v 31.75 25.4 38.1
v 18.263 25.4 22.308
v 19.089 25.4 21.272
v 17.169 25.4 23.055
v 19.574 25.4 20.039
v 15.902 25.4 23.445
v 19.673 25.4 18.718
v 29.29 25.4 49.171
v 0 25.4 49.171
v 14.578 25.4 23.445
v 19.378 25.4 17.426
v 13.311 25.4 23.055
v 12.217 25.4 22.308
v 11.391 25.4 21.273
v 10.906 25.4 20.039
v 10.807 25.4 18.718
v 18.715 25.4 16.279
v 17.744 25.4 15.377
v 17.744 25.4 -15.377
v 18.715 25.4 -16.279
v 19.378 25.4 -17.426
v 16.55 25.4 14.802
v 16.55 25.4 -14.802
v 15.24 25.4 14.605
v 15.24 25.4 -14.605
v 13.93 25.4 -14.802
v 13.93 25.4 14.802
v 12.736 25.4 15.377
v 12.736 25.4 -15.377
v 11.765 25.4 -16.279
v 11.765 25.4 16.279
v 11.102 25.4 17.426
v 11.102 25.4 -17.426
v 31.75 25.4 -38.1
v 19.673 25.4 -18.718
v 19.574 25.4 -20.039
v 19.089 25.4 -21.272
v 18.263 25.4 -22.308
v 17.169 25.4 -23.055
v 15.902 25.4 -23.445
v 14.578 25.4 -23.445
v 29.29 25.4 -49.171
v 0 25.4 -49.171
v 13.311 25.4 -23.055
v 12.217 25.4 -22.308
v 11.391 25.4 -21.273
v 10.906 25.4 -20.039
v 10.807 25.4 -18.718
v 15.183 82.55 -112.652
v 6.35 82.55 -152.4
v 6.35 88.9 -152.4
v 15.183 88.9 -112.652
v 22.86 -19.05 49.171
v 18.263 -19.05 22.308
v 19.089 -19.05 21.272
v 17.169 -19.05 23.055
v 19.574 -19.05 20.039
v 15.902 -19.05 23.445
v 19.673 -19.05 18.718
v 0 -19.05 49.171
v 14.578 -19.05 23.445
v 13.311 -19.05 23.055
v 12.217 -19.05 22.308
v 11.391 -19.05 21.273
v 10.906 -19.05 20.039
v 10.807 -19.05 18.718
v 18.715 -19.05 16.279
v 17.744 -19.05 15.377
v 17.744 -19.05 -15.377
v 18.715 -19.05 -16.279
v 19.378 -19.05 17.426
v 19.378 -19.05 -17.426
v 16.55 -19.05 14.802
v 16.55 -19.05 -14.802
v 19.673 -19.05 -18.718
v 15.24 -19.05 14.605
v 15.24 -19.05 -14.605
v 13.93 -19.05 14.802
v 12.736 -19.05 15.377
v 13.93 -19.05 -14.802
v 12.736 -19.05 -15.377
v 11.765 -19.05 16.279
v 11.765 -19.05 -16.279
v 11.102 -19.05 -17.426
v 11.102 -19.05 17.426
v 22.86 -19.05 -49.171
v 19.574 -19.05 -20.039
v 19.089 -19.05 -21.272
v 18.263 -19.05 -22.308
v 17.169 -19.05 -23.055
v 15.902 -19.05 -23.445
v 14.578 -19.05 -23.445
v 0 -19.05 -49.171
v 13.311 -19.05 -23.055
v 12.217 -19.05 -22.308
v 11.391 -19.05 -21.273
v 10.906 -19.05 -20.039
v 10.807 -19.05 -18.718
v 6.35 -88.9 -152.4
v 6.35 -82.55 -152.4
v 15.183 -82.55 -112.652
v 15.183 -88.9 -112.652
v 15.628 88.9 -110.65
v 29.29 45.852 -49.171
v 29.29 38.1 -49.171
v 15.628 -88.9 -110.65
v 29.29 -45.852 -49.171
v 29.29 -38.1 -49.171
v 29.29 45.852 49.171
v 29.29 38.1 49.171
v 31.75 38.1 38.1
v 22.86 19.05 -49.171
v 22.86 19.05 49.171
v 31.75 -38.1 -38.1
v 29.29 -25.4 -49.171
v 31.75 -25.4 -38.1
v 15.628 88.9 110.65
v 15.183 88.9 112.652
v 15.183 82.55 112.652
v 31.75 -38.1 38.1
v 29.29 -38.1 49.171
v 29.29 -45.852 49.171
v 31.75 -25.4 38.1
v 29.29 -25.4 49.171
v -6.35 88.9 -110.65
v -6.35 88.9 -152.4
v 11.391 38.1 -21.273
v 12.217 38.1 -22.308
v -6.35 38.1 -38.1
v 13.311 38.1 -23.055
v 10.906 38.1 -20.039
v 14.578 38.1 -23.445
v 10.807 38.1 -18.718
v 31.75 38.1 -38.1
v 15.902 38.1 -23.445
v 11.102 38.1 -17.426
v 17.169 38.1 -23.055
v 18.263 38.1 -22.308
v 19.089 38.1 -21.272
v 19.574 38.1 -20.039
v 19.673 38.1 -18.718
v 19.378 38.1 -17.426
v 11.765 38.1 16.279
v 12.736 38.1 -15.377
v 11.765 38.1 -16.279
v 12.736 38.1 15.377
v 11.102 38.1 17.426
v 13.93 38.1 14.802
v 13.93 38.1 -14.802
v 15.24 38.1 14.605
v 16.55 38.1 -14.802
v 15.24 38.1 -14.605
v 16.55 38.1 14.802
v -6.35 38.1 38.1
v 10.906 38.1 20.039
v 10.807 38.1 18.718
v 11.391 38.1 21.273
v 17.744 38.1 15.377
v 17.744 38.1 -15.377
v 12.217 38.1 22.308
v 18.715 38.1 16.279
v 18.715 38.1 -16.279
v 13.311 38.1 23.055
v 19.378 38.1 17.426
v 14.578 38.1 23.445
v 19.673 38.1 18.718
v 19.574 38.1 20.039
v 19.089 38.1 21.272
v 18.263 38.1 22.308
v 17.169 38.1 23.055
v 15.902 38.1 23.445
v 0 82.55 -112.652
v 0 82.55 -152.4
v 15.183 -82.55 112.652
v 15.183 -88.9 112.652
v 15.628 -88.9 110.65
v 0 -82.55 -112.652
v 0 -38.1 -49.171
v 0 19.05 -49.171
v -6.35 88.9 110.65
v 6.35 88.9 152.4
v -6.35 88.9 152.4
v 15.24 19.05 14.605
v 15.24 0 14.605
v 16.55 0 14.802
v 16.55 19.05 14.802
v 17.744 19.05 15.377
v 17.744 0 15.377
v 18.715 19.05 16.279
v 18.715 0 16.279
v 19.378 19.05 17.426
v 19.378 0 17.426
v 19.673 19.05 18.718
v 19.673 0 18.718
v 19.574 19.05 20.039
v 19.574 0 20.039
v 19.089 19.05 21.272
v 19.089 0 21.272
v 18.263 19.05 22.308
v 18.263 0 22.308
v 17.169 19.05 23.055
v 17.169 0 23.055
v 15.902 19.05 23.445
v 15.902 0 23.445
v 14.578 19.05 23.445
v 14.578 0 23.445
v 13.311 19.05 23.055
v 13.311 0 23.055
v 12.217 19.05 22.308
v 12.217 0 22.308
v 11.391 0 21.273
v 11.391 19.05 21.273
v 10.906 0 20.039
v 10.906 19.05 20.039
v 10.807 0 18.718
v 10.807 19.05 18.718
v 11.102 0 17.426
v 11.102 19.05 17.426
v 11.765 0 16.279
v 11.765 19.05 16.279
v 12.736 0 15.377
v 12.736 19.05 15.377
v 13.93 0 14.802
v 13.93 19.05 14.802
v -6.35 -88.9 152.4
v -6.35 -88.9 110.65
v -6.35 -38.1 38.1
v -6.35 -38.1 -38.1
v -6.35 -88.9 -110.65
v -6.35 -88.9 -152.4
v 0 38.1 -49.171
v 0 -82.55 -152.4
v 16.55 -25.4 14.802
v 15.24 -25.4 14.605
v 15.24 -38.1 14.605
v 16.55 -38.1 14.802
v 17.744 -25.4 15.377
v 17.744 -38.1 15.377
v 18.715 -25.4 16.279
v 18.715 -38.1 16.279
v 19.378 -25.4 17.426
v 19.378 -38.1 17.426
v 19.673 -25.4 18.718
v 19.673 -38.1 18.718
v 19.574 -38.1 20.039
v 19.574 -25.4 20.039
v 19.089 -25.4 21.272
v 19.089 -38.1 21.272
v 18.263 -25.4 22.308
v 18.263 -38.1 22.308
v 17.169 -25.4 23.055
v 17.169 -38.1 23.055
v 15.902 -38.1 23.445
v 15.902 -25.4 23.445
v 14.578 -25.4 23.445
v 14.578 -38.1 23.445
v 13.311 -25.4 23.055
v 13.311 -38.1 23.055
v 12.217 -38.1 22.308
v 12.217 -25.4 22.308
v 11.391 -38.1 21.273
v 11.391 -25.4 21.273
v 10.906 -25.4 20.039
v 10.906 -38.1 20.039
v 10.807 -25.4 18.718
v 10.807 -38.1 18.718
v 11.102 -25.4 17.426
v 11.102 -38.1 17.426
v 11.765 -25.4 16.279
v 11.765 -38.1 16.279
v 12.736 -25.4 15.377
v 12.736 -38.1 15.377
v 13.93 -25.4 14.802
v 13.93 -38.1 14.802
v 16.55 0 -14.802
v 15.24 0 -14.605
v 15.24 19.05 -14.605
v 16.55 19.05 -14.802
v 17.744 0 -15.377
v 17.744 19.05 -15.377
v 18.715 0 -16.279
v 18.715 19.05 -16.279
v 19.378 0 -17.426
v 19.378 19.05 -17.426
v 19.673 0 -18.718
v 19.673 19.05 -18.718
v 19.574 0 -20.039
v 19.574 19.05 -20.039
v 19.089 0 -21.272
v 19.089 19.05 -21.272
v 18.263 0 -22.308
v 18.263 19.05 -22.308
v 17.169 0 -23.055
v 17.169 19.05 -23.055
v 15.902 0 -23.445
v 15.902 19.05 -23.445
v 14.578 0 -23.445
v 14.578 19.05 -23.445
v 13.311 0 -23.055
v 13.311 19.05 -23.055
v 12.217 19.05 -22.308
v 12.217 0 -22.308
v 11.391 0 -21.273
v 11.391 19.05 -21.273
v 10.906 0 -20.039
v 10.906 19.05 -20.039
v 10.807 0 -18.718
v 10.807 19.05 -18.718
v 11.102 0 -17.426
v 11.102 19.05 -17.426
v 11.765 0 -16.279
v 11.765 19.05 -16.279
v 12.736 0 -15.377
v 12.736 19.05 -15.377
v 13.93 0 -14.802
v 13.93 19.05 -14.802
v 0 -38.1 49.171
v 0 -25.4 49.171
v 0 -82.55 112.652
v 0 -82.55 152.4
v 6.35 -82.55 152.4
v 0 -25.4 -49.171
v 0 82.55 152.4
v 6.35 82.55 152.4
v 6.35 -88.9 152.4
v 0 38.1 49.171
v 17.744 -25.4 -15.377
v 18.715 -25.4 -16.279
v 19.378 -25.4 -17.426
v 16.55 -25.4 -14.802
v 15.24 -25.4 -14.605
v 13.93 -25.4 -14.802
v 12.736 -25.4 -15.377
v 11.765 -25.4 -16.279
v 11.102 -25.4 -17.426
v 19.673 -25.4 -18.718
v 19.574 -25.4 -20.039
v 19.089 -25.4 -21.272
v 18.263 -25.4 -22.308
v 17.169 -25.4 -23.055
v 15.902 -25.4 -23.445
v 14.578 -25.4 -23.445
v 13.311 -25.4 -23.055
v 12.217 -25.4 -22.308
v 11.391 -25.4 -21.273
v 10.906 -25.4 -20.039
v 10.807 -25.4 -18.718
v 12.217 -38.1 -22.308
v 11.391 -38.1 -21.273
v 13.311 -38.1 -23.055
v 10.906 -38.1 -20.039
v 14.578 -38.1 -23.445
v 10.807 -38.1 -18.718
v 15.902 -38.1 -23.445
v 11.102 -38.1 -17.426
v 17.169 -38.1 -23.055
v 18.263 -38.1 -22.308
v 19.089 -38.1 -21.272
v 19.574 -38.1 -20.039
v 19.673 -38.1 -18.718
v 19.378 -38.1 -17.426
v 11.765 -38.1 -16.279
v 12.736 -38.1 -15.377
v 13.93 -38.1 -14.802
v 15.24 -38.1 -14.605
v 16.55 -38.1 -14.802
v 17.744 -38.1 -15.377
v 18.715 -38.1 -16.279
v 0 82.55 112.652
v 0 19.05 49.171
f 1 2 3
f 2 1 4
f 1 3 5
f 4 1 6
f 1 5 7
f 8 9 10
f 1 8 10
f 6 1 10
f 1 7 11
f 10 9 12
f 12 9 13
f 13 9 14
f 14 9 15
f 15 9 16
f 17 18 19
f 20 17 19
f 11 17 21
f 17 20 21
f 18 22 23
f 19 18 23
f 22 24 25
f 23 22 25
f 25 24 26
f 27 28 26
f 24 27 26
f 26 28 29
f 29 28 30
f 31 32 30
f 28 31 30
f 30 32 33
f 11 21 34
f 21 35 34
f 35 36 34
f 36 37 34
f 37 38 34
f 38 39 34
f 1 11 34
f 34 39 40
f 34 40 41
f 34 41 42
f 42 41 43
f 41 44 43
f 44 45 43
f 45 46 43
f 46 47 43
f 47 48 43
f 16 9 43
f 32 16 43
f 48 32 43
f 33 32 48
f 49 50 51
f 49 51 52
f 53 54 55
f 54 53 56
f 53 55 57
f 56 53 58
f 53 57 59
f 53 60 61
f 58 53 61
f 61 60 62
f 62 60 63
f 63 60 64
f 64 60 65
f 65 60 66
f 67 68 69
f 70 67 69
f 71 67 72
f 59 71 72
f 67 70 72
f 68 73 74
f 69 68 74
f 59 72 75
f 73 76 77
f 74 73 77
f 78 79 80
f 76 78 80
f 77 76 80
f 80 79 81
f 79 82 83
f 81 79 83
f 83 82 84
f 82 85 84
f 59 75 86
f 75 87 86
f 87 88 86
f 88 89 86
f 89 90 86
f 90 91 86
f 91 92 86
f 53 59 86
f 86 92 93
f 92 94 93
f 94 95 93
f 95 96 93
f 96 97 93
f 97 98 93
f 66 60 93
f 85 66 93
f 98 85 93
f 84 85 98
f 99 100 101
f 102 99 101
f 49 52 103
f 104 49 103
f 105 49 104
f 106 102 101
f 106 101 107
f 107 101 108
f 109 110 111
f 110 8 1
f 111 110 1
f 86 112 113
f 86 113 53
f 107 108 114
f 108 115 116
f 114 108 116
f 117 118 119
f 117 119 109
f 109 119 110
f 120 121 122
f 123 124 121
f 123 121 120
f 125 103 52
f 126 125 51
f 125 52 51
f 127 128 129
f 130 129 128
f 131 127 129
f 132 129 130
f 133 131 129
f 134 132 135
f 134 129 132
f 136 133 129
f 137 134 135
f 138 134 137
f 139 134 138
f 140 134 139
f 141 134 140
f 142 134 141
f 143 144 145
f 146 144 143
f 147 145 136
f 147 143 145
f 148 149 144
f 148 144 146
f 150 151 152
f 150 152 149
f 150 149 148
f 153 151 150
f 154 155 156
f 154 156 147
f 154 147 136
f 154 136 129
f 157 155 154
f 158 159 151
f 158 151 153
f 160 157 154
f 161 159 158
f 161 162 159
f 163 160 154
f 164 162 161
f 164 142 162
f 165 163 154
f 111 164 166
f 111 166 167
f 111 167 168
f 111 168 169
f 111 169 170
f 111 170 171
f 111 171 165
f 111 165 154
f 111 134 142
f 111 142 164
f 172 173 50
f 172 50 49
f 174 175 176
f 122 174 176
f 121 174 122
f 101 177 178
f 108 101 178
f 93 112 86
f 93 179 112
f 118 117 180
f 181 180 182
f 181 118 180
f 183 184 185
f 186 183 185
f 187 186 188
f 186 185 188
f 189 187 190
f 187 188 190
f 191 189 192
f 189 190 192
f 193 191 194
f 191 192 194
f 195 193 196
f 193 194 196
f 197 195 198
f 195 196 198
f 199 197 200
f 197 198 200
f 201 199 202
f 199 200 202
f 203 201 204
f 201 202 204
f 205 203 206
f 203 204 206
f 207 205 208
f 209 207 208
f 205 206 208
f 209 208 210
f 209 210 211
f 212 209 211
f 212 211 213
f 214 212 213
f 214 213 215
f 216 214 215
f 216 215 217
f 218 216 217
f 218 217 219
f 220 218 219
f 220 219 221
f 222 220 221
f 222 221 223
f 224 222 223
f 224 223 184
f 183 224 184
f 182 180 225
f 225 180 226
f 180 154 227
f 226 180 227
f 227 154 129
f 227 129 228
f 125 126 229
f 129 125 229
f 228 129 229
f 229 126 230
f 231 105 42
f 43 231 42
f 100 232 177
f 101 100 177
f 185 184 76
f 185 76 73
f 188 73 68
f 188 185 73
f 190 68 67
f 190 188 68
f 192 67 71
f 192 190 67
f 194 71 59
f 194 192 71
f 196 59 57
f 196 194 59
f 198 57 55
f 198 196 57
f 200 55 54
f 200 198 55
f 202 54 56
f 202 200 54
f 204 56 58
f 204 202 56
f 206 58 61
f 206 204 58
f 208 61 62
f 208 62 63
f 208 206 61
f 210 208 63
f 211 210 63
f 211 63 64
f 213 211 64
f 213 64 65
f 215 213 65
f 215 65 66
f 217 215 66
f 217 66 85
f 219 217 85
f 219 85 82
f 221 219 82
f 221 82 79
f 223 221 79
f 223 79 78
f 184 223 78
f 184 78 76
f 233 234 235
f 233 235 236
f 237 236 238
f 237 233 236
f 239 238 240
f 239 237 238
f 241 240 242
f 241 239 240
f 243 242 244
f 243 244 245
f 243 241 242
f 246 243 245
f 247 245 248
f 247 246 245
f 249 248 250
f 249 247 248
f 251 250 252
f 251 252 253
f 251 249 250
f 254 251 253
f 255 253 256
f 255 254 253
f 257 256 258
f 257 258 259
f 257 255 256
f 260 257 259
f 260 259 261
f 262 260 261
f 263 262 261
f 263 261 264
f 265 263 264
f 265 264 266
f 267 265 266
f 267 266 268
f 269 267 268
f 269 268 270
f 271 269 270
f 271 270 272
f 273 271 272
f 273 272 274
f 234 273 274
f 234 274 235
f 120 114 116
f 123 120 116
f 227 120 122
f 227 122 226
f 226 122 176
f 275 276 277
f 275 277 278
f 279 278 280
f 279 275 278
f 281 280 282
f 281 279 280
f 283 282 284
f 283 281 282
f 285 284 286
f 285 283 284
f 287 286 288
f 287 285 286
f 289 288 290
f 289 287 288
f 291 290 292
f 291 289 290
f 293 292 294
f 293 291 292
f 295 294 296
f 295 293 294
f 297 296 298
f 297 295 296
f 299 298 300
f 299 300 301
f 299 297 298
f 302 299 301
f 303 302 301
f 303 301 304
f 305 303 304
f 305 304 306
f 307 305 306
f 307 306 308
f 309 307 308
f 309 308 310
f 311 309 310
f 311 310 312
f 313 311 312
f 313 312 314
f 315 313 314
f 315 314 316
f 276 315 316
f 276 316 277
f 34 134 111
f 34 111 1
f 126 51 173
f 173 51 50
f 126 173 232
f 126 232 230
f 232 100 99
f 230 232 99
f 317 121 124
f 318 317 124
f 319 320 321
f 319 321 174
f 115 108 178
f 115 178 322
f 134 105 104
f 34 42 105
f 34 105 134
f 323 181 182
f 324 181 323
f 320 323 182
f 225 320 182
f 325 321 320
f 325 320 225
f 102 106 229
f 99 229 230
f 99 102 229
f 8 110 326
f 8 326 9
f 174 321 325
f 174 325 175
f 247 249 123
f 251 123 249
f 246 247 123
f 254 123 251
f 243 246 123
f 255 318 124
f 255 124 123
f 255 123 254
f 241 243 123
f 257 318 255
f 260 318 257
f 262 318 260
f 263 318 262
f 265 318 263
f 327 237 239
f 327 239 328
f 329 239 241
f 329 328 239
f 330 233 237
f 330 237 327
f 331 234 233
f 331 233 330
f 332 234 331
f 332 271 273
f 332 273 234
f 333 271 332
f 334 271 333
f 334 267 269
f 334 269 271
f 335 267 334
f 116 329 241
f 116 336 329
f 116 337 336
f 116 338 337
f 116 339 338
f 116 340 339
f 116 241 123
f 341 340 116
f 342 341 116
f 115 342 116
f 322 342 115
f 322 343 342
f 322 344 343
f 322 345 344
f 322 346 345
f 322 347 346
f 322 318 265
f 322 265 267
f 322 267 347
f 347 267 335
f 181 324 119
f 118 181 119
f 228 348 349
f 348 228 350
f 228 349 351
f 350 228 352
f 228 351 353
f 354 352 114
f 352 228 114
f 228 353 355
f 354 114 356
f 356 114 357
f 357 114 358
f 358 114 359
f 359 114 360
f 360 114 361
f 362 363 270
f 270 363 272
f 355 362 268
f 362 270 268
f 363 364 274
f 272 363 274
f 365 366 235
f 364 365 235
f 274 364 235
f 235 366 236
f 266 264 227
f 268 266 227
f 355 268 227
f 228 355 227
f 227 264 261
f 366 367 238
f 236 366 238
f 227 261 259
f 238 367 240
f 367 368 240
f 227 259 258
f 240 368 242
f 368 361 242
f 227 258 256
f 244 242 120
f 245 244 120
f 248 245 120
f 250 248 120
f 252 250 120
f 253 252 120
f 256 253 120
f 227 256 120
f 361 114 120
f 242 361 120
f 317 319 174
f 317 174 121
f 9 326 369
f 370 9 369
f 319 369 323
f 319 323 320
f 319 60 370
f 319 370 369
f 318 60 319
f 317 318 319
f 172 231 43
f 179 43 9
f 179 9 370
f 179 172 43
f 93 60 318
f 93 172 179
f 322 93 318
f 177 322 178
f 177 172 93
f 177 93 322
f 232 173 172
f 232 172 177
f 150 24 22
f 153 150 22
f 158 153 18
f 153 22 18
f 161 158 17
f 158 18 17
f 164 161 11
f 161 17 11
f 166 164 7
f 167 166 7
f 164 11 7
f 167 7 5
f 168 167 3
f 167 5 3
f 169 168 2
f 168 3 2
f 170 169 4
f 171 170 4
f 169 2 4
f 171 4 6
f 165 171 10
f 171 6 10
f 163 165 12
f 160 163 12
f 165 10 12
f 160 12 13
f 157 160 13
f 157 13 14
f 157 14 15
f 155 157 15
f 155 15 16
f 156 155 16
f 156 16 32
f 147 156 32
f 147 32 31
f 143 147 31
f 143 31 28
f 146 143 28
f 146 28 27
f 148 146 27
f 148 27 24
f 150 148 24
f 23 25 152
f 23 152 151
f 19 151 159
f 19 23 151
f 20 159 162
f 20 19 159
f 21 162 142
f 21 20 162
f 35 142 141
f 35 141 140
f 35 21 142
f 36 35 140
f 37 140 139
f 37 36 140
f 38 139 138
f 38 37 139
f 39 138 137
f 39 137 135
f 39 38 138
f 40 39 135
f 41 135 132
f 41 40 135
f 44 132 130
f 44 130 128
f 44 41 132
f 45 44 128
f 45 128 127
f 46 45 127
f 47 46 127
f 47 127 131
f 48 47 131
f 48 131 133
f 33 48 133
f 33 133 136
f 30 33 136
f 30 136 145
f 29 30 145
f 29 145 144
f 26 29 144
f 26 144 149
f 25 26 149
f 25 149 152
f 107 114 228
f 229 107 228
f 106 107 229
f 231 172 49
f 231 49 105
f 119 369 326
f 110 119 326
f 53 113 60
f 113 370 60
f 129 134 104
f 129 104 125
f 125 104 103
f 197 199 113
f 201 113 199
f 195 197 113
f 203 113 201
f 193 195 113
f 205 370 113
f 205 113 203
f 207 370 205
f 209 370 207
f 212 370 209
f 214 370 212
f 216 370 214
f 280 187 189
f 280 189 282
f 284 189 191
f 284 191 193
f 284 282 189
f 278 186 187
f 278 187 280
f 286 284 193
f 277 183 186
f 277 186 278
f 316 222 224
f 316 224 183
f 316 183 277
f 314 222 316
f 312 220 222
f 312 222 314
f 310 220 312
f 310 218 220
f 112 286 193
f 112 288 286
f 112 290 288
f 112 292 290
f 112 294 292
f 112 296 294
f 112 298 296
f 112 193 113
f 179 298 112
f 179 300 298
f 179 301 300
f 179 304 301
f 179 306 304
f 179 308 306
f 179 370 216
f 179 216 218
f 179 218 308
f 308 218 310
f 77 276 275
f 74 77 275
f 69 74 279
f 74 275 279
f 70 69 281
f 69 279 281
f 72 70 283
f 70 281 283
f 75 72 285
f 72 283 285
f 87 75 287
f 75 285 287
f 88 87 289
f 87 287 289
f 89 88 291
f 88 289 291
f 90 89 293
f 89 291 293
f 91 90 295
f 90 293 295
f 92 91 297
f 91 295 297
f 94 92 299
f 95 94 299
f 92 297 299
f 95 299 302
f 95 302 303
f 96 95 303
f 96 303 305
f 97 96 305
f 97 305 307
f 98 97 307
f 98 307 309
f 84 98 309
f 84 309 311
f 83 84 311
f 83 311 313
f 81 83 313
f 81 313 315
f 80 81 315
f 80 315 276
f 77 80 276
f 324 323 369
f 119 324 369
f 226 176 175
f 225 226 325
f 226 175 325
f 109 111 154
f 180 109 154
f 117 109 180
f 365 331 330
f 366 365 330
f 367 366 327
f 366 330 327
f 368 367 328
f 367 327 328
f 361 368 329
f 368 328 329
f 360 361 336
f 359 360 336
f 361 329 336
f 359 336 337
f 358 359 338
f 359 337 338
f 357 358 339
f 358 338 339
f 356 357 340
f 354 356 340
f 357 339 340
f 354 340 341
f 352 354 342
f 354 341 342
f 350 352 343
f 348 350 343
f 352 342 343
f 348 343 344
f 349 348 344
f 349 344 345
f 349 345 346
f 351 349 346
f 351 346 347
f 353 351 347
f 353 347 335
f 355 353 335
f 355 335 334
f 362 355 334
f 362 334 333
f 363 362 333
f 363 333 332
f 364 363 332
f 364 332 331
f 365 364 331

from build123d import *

# Parameters (mm, degrees)
SKETCH1_W           = 19.05
SKETCH1_H           = 49.170887152
BOSS_EXTRUDE1_DEPTH = 6.35
BOSS_EXTRUDE2_START = -6.35
SKETCH1_4_W         = 19.05
SKETCH1_4_H         = 49.170887152
BOSS_EXTRUDE2_DEPTH = 38.1
CUT_EXTRUDE1_START  = 31.75
SKETCH1_6_W         = 19.05
SKETCH1_6_H         = 49.170887152
CUT_EXTRUDE1_DEPTH  = 8.89
SKETCH3_R           = 4.445
CUT_EXTRUDE2_DEPTH  = 180.268046511


with BuildPart() as part:
    # Sketch1 → Boss-Extrude1 (new body)
    with BuildSketch(Plane.YZ):
        Polygon((-19.05, 0), (-25.4, 0), (-25.4, -49.170887152), (-38.1, -49.170887152), (-82.55, -112.652066052), (-82.55, -152.4), (0, -152.4), (0, -49.170887152), (-19.05, -49.170887152), align=None)
        Polygon((-25.4, 0), (-38.1, 0), (-38.1, -38.1), (-88.9, -110.649918742), (-88.9, -152.4), (-82.55, -152.4), (-82.55, -112.652066052), (-38.1, -49.170887152), (-25.4, -49.170887152), align=None)
        with Locations((-9.525, -24.585443576)):
            Rectangle(SKETCH1_W, SKETCH1_H)
    extrude(amount=-BOSS_EXTRUDE1_DEPTH)

    # Sketch1<4> → Boss-Extrude2 (add)
    with BuildSketch(Plane.YZ.offset(BOSS_EXTRUDE2_START)):
        Polygon((-25.4, 0), (-38.1, 0), (-38.1, -38.1), (-88.9, -110.649918742), (-88.9, -152.4), (-82.55, -152.4), (-82.55, -112.652066052), (-38.1, -49.170887152), (-25.4, -49.170887152), align=None)
        with Locations((-9.525, -24.585443576)):
            Rectangle(SKETCH1_4_W, SKETCH1_4_H)
    extrude(amount=BOSS_EXTRUDE2_DEPTH)

    # Sketch1<6> → Cut-Extrude1 (cut)
    with BuildSketch(Plane.YZ.offset(CUT_EXTRUDE1_START)):
        with Locations((-9.525, -24.585443576)):
            Rectangle(SKETCH1_6_W, SKETCH1_6_H)
    extrude(amount=-CUT_EXTRUDE1_DEPTH, mode=Mode.SUBTRACT)

    # Sketch3 → Cut-Extrude2 (cut, through all)
    with BuildSketch(Plane(origin=(0, 0, 0), x_dir=(-1, 0, 0), z_dir=(0, 1, 0))):
        Polygon((-15.182874211, -112.652066052), (-29.289802855, -49.170887152), (-31.75, -49.170887152), (-31.75, -112.652066052), align=None)
        Polygon((-6.35, -152.4), (-15.182874211, -112.652066052), (-31.75, -112.652066052), (-31.75, -152.4), align=None)
        with Locations(Location((-15.24, -19.05, 0), (0, 0, 90))):
            Circle(SKETCH3_R)
        Polygon((-31.75, -38.1), (-31.75, -49.170887152), (-29.289802855, -49.170887152), align=None)
    extrude(amount=-CUT_EXTRUDE2_DEPTH, mode=Mode.SUBTRACT)

    # Mirror1: part across plane


with BuildPart() as part_1:
    add(part.part)
    add(part.part.mirror(Plane(origin=(-6.35, 0, 0), x_dir=(0, 0, 1), z_dir=(0, -1, 0))))

    # Mirror2: part across plane


with BuildPart() as part_2:
    add(part_1.part)
    add(part_1.part.mirror(Plane(origin=(-6.35, 0, 0), x_dir=(1, 0, 0), z_dir=(0, 0, 1))))


solid = part_2.part
